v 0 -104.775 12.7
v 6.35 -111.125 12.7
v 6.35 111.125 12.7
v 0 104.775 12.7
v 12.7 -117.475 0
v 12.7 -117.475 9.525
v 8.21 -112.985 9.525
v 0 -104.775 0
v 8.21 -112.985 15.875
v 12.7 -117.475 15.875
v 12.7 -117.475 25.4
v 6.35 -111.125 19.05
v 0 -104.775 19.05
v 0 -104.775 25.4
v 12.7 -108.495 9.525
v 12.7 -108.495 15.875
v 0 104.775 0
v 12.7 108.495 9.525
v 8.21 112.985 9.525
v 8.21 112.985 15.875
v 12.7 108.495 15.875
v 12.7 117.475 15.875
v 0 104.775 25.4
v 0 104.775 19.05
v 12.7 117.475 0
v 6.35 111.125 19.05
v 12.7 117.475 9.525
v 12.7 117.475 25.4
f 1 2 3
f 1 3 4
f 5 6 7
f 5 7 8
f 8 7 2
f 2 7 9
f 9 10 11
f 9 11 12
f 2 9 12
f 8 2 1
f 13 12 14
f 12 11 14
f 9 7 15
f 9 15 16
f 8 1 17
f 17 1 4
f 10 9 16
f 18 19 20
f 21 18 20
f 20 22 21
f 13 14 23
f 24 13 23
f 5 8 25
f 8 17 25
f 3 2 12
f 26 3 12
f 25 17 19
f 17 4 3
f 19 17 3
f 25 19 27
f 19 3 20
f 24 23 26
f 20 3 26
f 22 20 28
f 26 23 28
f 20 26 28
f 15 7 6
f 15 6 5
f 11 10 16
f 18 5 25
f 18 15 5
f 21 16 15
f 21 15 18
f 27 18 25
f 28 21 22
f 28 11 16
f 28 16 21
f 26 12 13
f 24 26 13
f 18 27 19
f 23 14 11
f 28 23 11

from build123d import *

# Parameters (mm, degrees)
F0_W     = 234.95
F0_H     = 25.4
F1_DEPTH = 12.7
F2_W     = 6.35
F2_H     = 6.35
F3_DEPTH = 234.951
F5_DEPTH = 25.401
F6_W     = 6.35
F6_H     = 6.35
F7_DEPTH = 166.135738
F8_W     = 6.35
F8_H     = 6.35
F9_DEPTH = 166.135738


with BuildPart() as f1:
    # F0 (on Right) → F1 (new body)
    with BuildSketch(Plane.YZ):
        with Locations((0, 12.7)):
            Rectangle(F0_W, F0_H)
    extrude(amount=F1_DEPTH)

    # F2 (on face) → F3 (cut, through all)
    with BuildSketch(Plane(origin=(0, 117.475, 0), x_dir=(-1, 0, 0), z_dir=(0, 1, 0))):
        with Locations((-3.175, 15.875)):
            Rectangle(F2_W, F2_H)
    extrude(amount=-F3_DEPTH, mode=Mode.SUBTRACT)

    # F4 (on face) → F5 (cut, through all)
    with BuildSketch(Plane.XY.offset(25.4)):
        Polygon((0, 117.475), (0, 104.775), (12.7, 117.475), align=None)
        Polygon((12.7, -117.475), (0, -104.775), (0, -117.475), align=None)
    extrude(amount=-F5_DEPTH, mode=Mode.SUBTRACT)

    # F6 (on face) → F7 (cut, through all)
    with BuildSketch(Plane(origin=(-52.3875, -52.3875, 0), x_dir=(0.707107, -0.707107, 0), z_dir=(-0.707107, -0.707107, 0))):
        with Locations((88.872625, 12.7)):
            Rectangle(F6_W, F6_H)
    extrude(amount=-F7_DEPTH, mode=Mode.SUBTRACT)

    # F8 (on face) → F9 (cut, through all)
    with BuildSketch(Plane(origin=(-52.3875, 52.3875, 0), x_dir=(-0.707107, -0.707107, 0), z_dir=(-0.707107, 0.707107, 0))):
        with Locations((-88.872625, 12.7)):
            Rectangle(F8_W, F8_H)
    extrude(amount=-F9_DEPTH, mode=Mode.SUBTRACT)


solid = f1.part
